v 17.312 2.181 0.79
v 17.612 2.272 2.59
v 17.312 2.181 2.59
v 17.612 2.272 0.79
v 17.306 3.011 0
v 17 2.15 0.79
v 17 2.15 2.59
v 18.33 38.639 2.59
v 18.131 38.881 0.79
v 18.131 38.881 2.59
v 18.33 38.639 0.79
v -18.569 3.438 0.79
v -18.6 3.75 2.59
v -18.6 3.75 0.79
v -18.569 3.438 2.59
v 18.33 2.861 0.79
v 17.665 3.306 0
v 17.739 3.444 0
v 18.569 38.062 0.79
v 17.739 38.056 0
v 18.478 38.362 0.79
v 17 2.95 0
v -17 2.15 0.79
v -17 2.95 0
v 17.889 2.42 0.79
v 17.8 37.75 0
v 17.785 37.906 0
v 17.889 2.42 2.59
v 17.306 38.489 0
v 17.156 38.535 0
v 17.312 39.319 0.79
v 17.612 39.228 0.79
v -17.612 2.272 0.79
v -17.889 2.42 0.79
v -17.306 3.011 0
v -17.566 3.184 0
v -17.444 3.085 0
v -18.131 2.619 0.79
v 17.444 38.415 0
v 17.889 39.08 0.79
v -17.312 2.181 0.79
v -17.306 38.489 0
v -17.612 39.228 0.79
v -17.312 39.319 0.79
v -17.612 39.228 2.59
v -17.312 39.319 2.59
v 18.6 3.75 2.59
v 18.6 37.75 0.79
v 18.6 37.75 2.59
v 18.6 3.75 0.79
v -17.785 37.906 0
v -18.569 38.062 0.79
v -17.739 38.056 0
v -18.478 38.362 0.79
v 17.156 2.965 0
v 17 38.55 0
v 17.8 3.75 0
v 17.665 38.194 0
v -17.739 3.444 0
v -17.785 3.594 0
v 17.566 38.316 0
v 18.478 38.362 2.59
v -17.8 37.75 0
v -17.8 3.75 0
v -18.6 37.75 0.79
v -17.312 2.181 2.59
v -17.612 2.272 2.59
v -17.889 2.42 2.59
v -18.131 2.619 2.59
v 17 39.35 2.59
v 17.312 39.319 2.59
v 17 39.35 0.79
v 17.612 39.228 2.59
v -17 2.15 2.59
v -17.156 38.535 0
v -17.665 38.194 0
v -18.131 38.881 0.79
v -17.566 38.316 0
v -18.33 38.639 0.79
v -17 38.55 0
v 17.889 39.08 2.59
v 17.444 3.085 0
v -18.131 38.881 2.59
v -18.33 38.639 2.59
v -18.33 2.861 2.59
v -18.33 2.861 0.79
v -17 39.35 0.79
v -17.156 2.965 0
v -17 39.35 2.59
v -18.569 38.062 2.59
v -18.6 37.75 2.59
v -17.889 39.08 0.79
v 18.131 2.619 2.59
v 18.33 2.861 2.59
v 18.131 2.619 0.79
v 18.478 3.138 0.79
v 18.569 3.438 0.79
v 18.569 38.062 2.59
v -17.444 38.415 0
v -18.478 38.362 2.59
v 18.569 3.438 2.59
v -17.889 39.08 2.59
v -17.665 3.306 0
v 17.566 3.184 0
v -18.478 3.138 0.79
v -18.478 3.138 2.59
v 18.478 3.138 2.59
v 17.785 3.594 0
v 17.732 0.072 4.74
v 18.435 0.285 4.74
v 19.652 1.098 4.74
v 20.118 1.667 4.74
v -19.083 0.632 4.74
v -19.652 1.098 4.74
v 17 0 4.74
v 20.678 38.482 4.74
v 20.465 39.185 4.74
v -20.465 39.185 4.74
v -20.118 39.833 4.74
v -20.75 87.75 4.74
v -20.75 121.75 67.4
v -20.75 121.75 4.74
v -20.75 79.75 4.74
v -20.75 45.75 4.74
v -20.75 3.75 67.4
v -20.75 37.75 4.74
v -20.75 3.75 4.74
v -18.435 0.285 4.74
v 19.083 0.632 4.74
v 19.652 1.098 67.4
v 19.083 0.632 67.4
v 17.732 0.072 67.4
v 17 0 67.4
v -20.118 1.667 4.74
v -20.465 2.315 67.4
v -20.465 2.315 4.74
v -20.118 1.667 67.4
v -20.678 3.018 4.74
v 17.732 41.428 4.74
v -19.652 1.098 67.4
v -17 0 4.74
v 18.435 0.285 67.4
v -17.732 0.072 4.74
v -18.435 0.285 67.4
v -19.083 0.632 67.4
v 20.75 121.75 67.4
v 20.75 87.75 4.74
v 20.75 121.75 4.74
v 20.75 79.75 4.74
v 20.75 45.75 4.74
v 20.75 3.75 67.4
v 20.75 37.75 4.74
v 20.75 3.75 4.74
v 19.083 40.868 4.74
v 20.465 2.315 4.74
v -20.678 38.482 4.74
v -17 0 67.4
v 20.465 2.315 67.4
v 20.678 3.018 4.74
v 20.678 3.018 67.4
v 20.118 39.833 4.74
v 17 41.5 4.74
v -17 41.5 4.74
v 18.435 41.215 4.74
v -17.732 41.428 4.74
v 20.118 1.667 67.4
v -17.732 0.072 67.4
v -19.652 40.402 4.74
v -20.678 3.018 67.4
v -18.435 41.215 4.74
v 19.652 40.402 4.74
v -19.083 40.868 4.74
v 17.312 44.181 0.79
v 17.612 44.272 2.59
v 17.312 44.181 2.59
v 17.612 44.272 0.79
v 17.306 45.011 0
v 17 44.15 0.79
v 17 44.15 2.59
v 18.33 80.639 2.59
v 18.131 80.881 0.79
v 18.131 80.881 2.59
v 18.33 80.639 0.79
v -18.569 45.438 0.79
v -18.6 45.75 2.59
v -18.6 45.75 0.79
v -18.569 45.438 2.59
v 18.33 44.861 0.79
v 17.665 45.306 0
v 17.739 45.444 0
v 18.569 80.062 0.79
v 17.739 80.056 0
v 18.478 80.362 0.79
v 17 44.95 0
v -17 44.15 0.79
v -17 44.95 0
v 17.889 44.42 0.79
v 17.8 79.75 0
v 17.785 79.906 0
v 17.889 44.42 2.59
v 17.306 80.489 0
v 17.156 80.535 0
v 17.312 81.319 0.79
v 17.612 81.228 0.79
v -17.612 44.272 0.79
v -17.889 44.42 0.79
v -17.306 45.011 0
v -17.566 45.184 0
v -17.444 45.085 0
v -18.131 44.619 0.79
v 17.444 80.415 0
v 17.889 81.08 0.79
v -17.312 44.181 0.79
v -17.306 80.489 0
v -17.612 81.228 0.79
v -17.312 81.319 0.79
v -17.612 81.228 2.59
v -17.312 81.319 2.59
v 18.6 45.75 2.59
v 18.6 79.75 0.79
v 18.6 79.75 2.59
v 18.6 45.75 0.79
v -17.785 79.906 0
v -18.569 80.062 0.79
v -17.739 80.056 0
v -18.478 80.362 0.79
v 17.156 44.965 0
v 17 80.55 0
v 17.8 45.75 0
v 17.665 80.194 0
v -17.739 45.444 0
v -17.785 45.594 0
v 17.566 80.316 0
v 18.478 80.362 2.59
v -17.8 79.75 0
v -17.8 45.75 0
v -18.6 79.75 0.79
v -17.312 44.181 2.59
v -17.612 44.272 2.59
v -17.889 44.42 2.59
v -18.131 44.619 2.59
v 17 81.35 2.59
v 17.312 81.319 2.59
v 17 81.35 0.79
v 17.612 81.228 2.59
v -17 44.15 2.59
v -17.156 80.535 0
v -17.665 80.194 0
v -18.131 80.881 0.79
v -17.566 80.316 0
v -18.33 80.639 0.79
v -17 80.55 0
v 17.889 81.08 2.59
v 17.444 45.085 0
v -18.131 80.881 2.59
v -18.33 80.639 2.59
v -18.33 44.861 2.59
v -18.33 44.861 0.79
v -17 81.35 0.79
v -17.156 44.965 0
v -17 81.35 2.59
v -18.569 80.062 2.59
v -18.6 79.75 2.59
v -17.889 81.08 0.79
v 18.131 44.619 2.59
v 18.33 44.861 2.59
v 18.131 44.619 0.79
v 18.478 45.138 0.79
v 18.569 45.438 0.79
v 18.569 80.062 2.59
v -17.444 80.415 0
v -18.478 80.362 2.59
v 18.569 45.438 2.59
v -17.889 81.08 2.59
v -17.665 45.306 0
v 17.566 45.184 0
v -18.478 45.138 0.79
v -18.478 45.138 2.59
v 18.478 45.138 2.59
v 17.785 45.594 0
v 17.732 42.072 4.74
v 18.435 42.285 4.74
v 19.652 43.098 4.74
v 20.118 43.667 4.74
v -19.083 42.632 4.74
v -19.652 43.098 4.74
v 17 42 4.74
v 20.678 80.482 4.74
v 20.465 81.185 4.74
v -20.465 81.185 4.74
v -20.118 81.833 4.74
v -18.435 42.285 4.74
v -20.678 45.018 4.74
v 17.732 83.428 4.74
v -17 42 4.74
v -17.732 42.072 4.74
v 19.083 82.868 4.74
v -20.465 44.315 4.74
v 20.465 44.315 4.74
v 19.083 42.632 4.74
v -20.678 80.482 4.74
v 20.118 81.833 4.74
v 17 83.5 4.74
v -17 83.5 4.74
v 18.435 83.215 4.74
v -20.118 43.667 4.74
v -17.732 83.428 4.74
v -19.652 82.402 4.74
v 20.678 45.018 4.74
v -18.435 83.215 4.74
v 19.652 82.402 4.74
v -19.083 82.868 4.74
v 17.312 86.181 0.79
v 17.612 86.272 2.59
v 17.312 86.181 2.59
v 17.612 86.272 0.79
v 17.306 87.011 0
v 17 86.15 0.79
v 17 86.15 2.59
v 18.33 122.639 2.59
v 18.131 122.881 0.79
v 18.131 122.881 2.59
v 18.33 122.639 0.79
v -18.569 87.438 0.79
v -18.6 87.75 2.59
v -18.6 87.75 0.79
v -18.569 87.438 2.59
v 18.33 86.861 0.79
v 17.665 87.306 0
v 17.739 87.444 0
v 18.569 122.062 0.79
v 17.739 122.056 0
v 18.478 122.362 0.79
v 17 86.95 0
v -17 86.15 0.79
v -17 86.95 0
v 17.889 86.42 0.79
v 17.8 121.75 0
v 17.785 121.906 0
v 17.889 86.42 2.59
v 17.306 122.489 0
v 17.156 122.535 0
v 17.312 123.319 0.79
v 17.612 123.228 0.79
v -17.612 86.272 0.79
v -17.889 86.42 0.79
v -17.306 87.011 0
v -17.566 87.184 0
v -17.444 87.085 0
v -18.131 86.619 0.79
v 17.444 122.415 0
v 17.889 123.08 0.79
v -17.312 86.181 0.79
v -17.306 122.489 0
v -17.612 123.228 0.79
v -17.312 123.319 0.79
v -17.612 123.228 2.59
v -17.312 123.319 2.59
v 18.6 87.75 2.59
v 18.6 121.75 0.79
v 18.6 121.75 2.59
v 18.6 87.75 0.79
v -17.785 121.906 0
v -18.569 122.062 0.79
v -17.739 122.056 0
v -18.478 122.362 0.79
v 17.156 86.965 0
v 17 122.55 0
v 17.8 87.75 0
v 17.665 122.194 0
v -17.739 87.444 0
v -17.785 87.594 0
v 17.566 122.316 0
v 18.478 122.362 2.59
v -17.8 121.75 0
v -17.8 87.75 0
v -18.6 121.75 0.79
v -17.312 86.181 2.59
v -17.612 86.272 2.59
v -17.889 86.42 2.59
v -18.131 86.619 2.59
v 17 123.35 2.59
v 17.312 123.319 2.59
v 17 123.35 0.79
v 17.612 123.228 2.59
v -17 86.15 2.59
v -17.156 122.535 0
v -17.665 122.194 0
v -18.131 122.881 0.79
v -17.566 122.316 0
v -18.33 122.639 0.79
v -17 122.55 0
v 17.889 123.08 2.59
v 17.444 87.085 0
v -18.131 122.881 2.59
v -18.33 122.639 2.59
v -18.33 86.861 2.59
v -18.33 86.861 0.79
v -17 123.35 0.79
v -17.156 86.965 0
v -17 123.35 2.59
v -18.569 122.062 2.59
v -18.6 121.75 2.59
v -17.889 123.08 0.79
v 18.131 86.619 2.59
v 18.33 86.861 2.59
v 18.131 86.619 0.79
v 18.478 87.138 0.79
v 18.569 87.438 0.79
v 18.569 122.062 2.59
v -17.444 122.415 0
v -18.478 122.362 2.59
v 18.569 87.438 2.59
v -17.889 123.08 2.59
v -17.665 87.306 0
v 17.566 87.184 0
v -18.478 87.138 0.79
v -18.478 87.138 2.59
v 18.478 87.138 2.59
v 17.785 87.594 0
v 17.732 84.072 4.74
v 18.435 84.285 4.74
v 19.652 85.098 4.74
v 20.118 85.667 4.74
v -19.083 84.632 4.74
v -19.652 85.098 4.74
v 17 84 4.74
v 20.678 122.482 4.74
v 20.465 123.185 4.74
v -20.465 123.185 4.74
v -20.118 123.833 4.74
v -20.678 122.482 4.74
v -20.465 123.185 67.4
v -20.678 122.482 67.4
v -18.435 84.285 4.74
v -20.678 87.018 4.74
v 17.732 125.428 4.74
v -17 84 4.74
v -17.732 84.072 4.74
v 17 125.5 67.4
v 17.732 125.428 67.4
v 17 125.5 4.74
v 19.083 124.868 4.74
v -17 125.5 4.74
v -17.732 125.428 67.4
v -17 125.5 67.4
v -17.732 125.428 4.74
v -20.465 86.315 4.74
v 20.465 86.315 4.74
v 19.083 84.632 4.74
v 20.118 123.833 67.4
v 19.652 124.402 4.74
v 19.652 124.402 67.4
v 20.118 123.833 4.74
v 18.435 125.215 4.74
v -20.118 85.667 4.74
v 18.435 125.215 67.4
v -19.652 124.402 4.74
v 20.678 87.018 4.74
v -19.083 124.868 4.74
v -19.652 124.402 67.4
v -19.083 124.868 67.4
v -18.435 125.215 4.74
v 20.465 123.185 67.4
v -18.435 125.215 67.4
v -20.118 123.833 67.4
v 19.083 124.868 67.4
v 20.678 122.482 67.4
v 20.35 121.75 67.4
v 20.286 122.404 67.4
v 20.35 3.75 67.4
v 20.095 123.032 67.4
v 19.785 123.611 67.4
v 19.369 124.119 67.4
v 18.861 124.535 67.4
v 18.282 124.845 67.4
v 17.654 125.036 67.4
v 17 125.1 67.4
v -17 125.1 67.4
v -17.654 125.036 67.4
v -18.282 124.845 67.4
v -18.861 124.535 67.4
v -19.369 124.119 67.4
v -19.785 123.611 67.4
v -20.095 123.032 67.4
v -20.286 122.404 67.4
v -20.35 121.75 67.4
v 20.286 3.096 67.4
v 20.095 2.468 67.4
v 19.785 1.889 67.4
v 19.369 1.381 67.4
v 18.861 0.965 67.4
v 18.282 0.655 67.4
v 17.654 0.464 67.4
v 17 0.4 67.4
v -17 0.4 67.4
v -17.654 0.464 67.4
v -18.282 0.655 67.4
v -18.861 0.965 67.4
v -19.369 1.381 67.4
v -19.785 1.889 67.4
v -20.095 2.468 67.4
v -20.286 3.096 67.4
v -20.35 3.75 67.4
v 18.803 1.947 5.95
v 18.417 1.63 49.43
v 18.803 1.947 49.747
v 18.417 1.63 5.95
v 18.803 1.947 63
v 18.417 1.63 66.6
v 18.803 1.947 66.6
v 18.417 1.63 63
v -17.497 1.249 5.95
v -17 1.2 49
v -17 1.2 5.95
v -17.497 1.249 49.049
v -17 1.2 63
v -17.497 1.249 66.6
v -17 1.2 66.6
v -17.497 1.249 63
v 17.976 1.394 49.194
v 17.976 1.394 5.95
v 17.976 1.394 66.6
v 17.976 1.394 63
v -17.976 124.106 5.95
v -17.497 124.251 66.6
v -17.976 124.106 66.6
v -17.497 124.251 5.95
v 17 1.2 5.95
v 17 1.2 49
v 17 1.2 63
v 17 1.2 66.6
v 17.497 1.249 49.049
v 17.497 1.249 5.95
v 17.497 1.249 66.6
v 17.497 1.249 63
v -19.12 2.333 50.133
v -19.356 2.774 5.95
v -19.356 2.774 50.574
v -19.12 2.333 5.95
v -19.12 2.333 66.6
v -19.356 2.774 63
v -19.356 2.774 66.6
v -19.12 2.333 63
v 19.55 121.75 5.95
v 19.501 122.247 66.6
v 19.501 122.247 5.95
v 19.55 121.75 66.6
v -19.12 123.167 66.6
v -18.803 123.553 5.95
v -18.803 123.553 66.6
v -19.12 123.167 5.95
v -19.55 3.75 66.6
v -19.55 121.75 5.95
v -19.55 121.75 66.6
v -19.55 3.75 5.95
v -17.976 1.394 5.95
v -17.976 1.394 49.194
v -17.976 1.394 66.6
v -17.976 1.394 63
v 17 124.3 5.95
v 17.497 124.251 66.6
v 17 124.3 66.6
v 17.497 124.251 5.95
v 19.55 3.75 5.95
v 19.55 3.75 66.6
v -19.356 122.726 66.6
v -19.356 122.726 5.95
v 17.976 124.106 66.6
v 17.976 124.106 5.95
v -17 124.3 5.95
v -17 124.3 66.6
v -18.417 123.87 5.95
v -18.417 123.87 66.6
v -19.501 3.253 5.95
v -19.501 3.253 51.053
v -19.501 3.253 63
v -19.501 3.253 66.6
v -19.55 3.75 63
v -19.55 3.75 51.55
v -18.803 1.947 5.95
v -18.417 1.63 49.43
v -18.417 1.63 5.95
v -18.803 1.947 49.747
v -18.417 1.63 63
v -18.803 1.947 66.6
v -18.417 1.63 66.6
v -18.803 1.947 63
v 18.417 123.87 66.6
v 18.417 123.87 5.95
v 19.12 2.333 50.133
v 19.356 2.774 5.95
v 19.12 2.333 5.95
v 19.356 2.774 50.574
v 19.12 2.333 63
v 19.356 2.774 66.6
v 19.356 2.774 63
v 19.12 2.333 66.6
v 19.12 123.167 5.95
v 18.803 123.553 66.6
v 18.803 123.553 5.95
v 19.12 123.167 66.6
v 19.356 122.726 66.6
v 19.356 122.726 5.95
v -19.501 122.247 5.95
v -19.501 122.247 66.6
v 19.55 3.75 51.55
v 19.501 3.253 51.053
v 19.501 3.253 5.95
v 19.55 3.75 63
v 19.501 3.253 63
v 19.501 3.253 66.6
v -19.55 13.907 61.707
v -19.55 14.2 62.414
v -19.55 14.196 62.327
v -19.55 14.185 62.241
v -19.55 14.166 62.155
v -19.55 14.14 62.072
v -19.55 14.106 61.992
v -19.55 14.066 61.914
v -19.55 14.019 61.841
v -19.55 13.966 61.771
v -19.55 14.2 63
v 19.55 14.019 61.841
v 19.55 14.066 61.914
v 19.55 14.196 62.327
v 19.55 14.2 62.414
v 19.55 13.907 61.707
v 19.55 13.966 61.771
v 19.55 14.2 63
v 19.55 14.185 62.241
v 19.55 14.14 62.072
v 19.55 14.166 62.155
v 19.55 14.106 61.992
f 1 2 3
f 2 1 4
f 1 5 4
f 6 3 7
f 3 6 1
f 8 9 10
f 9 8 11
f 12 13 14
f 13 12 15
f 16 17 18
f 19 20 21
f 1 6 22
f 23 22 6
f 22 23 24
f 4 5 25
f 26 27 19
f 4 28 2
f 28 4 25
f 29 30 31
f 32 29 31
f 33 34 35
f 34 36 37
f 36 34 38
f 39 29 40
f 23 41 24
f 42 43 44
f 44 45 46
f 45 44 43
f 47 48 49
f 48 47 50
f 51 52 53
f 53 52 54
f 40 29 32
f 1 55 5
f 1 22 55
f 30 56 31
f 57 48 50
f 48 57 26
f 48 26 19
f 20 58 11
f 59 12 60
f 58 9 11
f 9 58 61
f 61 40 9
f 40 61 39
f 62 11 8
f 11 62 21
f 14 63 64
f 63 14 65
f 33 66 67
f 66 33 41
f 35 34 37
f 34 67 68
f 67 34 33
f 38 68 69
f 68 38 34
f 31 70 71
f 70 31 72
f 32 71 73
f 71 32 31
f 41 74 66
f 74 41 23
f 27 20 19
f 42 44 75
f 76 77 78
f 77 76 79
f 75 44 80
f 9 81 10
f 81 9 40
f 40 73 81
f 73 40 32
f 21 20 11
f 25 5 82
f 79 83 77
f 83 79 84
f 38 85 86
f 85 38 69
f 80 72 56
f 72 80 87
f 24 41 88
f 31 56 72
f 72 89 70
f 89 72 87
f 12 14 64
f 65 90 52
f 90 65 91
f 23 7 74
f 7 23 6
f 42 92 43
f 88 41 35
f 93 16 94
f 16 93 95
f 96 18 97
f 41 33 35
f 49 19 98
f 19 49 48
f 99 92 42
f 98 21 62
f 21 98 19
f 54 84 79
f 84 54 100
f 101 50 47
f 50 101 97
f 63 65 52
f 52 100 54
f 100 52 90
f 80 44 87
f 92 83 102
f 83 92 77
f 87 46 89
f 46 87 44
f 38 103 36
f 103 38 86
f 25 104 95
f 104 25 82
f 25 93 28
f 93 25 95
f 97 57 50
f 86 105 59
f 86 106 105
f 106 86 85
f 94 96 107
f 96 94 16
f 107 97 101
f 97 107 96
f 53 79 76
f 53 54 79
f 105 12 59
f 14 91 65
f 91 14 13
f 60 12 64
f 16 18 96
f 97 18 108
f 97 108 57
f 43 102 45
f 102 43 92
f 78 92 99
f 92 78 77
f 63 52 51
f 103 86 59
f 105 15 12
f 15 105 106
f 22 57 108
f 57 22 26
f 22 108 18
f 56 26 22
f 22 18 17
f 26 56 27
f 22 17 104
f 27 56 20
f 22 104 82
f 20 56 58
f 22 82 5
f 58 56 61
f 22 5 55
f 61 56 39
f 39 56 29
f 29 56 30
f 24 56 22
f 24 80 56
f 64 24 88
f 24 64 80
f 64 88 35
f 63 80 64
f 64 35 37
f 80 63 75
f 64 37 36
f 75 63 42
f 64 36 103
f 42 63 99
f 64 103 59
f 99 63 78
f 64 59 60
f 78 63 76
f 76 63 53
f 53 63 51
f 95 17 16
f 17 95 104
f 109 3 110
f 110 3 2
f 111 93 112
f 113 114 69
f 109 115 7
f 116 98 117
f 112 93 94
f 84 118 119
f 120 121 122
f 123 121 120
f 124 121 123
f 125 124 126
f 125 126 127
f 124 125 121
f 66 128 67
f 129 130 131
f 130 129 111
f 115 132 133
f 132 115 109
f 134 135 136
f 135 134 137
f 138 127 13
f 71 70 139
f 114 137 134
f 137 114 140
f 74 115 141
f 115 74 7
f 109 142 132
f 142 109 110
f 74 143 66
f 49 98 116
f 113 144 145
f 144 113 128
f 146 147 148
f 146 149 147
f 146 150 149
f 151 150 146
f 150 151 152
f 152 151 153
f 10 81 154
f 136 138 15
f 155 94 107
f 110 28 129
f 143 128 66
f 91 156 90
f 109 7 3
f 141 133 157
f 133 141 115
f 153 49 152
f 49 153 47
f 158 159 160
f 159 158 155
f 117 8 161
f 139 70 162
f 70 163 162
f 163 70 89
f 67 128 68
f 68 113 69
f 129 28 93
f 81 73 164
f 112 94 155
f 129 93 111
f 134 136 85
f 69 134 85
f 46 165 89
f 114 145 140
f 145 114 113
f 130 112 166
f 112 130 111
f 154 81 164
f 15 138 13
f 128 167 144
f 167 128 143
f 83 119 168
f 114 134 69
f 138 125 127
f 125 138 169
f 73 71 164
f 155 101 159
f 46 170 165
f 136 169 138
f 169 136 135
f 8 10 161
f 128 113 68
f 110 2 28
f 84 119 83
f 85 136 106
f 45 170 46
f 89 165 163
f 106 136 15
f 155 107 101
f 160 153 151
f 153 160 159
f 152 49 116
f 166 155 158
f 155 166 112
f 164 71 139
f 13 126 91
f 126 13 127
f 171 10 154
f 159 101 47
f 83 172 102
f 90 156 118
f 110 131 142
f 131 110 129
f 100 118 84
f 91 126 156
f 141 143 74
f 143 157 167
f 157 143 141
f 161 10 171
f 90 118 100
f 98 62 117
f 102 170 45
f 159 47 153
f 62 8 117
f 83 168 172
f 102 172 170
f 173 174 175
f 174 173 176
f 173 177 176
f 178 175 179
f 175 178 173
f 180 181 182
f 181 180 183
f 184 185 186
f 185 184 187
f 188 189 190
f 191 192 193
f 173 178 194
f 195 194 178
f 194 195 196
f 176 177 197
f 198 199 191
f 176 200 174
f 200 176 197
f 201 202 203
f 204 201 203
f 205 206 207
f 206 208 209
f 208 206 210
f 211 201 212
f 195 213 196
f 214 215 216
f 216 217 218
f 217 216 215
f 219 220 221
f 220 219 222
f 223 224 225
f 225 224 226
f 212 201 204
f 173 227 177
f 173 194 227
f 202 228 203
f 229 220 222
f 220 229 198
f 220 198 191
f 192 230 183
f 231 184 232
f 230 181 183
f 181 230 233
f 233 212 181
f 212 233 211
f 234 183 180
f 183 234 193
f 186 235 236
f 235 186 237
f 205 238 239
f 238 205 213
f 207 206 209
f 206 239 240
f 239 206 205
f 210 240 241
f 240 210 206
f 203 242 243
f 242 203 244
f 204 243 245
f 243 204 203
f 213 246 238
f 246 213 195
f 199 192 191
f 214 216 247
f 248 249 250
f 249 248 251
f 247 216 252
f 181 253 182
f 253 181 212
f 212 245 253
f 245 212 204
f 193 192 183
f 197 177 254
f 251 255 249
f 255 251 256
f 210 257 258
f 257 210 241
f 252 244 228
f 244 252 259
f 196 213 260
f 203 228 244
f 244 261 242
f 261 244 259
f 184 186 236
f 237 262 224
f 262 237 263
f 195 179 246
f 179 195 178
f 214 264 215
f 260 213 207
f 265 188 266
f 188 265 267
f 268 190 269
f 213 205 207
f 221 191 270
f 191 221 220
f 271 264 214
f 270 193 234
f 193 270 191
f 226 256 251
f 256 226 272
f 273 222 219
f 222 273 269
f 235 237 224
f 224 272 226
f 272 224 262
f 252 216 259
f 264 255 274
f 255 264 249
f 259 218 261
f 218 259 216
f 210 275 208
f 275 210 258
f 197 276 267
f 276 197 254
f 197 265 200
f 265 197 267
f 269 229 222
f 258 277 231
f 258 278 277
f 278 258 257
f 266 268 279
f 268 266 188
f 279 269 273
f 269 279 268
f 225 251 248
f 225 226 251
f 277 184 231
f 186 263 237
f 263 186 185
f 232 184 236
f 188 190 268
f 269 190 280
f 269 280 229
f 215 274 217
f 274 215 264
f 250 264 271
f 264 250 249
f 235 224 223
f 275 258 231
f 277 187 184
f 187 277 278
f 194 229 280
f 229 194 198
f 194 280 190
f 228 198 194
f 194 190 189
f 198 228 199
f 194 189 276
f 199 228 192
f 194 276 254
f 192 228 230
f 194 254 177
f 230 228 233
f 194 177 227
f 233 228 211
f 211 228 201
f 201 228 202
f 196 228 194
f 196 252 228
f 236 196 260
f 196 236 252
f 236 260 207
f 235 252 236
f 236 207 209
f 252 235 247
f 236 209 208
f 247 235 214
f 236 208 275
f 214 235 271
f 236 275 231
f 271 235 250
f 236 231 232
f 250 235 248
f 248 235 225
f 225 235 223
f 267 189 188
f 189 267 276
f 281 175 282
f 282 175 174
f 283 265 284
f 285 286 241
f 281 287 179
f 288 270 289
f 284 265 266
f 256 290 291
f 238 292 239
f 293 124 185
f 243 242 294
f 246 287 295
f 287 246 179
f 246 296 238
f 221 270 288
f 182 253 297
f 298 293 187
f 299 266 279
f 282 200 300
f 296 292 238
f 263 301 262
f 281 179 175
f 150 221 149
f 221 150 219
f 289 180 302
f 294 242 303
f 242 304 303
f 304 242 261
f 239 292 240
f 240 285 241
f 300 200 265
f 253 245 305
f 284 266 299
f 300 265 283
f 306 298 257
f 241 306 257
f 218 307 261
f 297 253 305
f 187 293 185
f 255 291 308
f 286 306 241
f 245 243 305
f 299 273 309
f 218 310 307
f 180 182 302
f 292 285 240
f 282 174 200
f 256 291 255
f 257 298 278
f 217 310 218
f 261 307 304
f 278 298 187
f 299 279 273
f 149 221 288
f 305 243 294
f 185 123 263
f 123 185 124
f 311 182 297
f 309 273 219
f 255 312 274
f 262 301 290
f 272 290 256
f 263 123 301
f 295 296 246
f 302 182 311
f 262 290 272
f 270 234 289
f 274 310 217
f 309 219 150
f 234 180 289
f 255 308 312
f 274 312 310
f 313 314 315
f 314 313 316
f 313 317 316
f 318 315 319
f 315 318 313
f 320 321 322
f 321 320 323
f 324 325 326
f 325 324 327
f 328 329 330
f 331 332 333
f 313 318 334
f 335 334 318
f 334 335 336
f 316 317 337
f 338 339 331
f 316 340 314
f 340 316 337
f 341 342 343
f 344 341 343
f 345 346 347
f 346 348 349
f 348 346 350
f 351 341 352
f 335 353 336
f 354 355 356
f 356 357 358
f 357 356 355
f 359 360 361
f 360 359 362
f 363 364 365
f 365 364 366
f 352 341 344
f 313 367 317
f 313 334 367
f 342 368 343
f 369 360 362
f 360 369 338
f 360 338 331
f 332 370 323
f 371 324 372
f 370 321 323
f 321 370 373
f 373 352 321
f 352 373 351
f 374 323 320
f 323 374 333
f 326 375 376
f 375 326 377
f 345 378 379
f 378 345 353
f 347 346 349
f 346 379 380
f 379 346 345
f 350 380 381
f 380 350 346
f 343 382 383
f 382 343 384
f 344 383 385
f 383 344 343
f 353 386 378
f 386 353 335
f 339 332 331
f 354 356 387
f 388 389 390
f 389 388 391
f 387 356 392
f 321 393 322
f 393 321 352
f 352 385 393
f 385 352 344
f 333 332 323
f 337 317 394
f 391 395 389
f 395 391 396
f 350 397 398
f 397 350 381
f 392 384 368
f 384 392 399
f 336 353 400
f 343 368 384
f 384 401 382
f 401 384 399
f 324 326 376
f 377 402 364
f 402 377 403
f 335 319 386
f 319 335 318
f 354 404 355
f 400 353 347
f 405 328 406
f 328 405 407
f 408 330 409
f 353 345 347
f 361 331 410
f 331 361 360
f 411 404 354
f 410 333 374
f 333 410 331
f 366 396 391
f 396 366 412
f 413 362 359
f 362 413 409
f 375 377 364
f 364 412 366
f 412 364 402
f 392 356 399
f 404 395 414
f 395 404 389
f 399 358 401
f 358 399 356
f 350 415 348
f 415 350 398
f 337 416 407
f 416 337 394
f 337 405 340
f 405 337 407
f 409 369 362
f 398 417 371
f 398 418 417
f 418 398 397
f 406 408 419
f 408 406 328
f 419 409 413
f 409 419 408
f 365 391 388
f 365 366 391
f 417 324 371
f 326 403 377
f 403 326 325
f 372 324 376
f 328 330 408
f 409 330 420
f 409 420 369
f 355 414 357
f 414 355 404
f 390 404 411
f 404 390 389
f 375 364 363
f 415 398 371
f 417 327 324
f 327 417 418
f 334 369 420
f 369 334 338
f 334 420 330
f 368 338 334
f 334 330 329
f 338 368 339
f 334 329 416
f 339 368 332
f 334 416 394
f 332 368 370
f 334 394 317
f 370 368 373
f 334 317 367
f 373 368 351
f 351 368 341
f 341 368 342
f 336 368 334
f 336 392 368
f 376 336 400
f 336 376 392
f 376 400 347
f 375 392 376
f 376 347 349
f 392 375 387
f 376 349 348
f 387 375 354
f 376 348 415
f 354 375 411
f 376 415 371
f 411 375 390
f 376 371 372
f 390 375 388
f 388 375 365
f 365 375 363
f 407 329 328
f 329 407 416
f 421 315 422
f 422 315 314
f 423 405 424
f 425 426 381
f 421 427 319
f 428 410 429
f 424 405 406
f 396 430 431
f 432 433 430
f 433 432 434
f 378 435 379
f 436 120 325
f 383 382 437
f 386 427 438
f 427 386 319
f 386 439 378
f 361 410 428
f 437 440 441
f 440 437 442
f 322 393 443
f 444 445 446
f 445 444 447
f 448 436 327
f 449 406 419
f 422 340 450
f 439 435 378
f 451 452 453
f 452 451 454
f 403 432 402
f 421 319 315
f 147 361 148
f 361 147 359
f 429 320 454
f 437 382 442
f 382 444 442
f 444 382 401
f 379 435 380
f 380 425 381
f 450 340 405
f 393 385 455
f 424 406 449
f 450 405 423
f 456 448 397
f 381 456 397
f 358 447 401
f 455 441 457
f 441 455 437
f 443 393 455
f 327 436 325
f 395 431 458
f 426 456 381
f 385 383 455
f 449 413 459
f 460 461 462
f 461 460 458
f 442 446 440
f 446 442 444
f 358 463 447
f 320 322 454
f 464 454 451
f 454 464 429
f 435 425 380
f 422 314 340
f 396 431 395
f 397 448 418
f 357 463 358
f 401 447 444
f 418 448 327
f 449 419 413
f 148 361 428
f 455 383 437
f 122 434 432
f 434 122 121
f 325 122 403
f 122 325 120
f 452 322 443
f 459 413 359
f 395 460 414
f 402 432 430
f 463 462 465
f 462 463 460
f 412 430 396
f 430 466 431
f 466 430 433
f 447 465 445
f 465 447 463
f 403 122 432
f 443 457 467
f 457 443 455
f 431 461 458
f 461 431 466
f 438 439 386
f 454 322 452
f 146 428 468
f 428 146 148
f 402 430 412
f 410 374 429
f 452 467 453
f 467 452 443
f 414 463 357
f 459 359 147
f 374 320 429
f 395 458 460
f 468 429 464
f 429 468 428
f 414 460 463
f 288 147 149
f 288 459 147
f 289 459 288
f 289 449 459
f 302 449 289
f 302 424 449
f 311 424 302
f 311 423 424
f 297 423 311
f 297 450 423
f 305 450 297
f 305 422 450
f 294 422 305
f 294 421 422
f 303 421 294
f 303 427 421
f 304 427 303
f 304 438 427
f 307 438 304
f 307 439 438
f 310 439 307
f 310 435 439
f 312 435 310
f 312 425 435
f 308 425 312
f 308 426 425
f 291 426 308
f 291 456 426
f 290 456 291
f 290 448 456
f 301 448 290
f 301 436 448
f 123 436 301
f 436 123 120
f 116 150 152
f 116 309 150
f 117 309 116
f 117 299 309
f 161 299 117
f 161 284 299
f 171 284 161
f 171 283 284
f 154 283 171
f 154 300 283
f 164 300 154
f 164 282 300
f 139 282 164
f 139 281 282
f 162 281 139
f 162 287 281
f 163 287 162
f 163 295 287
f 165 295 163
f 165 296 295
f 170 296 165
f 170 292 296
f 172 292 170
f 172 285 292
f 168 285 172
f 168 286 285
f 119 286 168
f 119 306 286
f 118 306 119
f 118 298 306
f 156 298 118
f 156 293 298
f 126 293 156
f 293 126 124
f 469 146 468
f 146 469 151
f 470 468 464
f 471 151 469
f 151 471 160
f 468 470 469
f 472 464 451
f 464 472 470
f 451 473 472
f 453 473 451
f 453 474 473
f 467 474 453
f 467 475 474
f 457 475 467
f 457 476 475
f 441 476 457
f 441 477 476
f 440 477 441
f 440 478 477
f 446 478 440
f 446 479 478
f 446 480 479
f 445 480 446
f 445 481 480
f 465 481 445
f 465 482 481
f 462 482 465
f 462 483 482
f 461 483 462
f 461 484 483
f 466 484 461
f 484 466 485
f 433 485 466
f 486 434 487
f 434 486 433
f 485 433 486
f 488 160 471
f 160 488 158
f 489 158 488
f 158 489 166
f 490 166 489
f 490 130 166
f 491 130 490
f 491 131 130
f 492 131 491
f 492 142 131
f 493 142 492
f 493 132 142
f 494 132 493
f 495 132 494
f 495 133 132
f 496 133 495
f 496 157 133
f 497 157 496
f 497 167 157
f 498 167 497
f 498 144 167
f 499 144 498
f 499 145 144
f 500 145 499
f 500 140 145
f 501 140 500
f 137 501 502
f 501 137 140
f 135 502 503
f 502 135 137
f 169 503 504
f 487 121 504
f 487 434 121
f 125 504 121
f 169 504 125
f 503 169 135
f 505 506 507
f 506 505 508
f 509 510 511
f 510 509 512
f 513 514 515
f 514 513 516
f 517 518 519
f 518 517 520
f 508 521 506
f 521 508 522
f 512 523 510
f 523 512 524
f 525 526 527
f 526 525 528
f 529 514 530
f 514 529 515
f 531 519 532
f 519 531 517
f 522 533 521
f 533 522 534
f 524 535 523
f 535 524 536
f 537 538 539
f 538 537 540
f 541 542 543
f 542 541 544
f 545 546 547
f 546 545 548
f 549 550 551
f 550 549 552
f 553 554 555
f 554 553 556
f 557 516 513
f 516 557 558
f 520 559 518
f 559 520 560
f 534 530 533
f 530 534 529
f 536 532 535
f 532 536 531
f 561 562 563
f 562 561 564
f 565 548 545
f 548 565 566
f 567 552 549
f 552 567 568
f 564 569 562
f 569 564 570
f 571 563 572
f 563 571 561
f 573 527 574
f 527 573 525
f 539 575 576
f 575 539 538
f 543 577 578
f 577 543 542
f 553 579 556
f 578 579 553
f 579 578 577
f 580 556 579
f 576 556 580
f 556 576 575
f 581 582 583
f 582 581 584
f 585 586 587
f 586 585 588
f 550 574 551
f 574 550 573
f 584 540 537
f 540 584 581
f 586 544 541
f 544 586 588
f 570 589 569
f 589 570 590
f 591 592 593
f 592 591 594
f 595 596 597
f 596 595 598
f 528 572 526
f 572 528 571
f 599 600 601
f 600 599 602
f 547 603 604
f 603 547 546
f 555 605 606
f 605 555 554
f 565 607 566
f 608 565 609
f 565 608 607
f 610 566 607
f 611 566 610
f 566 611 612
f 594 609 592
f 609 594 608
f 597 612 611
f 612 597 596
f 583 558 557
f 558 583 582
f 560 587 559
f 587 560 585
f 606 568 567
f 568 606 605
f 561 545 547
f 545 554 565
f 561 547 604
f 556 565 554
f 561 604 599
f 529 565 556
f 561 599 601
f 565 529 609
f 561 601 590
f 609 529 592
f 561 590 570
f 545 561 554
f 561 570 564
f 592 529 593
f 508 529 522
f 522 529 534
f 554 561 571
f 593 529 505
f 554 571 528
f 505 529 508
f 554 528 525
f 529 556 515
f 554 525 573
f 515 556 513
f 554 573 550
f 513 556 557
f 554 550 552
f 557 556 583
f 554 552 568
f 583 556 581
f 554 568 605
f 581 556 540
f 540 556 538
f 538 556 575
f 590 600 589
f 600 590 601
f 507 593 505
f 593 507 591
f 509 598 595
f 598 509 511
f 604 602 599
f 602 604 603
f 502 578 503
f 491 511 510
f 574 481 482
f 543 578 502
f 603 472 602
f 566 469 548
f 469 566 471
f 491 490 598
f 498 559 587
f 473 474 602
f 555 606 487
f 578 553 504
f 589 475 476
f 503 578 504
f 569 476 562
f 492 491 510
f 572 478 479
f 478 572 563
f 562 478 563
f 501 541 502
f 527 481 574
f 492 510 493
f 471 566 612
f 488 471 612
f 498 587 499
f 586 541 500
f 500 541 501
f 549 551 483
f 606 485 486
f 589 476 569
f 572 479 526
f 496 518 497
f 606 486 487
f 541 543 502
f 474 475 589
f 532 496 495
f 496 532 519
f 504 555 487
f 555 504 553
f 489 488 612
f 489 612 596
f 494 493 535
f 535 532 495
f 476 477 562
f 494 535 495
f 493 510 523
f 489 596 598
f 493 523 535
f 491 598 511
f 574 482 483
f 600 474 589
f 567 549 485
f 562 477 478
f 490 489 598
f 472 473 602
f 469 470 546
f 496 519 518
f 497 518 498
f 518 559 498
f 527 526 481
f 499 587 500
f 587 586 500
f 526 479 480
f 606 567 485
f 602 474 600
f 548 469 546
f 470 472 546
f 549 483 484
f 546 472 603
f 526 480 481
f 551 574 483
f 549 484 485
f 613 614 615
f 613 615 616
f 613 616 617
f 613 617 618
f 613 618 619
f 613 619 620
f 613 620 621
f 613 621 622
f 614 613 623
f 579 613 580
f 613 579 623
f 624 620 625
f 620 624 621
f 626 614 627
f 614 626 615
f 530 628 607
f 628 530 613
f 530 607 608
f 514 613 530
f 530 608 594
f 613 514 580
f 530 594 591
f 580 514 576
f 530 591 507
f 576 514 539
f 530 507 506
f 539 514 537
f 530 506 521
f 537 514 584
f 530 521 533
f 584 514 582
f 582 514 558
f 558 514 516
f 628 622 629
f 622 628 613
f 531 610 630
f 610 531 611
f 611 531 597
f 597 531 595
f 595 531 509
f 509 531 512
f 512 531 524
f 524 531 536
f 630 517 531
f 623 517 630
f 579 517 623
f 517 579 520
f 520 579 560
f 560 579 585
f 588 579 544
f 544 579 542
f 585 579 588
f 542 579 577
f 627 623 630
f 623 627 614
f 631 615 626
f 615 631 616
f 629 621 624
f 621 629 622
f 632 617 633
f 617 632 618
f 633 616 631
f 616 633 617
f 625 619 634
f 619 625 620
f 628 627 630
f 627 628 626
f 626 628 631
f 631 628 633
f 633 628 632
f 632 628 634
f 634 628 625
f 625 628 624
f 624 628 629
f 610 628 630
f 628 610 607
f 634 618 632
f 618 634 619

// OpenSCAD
// file: ../../../modules/gridfinity.scad
// Gridfinity ベースプレートの共有 module。
// 寸法は Gridfinity 仕様 (Zack Freedman) の baseplate 輪郭に従う:
//   ピッチ 42、ソケット上端開口 41.5 (角 R4)、上から 45° 面取り 2.15 →
//   垂直 1.8 (37.2 角・R1.85) → 45° 面取り 0.7 → 底 35.8 角 (R1.15)。
//   ソケット深さ = 2.15 + 1.8 + 0.7 = 4.65。
//
// 座標系: X が列方向 (中央が 0)、Y が行方向 (板の前端が 0)、Z=0 が板の底面。
// 板の外形は grid とは独立に rim で与えるので、grid より大きい板 (縁付き) を
// 作れる。ソケットは rim=[left, right, front, back] の内側へ 42 ピッチで並ぶ。

gf_pitch = 42;
gf_socket_top = 41.5; // 上端開口
gf_socket_mid = 37.2; // 垂直部
gf_socket_bot = 35.8; // 底
gf_socket_r_top = 4;
gf_socket_r_mid = 1.85;
gf_socket_r_bot = 1.15;
gf_chamfer_top = 2.15;
gf_wall_h = 1.8;
gf_chamfer_bot = 0.7;
gf_socket_depth = gf_chamfer_top + gf_wall_h + gf_chamfer_bot; // 4.65
gf_fn = 32;
gf_eps = 0.01; // hull 用の薄板の厚さ
gf_over = 0.5; // 切削の抜き代

// 角丸正方形または矩形 (w は一辺、または [幅, 奥行き]、角 R)
module
gf_rounded_square(w, r)
{
    offset(r = r, $fn = gf_fn)
        square(is_list(w) ? w - [ 2 * r, 2 * r ] : w - 2 * r, center = true);
}

// 厚さ gf_eps の角丸正方形の薄板を z に置く (hull の骨)
module
gf_slab(w, r, z)
{
    translate([ 0, 0, z ]) linear_extrude(gf_eps) gf_rounded_square(w, r);
}

// ソケット1個の切削体。z=0 がソケットの底 (床の天面)、+Z へ 4.65 で天面に出る。
// clearance は嵌合の逃げで、輪郭を全周へ clearance だけ外へ出す (幅 +2c、角 R
// +c)。pitch_x は X 方向のセル幅。端数でも角 R と面取りの寸法を保つ。
module
gf_socket_cut(clearance = 0, pitch_x = gf_pitch)
{
    z1 = gf_chamfer_bot;
    z2 = z1 + gf_wall_h;
    z3 = gf_socket_depth;
    c = clearance;
    assert(pitch_x > gf_pitch - gf_socket_top + 2 * gf_socket_r_top,
           "Cell width is too small for the socket corner radius");
    delta = [ pitch_x - gf_pitch, 0 ];
    bot = [ gf_socket_bot + 2 * c, gf_socket_bot + 2 * c ] + delta;
    mid = [ gf_socket_mid + 2 * c, gf_socket_mid + 2 * c ] + delta;
    top = [ gf_socket_top + 2 * c, gf_socket_top + 2 * c ] + delta;
    hull()
    {
        gf_slab(bot, gf_socket_r_bot + c, 0);
        gf_slab(mid, gf_socket_r_mid + c, z1 - gf_eps);
    }
    hull()
    {
        gf_slab(mid, gf_socket_r_mid + c, z1 - gf_eps);
        gf_slab(mid, gf_socket_r_mid + c, z2 - gf_eps);
    }
    hull()
    {
        gf_slab(mid, gf_socket_r_mid + c, z2 - gf_eps);
        gf_slab(top, gf_socket_r_top + c, z3 - gf_eps);
    }
    // 天面より上へ抜く (天面と同一平面の退化した面を残さない)
    gf_slab(top, gf_socket_r_top + c, z3 - gf_eps);
    translate([ 0, 0, z3 - gf_eps ]) linear_extrude(gf_over + gf_eps)
        gf_rounded_square(top, gf_socket_r_top + c);
}

// ベースプレート。cols x rows のソケットを床 floor_t の上に彫る。
// rim = [left, right, front, back] はソケット列の外側に残す縁の幅。
// 板の幅 = cols*42 + left + right、奥行き = rows*42 + front + back。
// cols の端数は左端の細幅セルになる。rows は正の整数。
// clearance はソケットの嵌合の逃げ (gf_socket_cut を参照)。
module
gf_baseplate(cols, rows, rim = [ 0, 0, 0, 0 ], floor_t = 1, clearance = 0)
{
    grid_w = cols * gf_pitch;
    grid_d = rows * gf_pitch;
    plate_w = grid_w + rim[0] + rim[1];
    plate_d = grid_d + rim[2] + rim[3];
    x0 = -plate_w / 2 + rim[0]; // ソケット列の左端
    first_pitch = grid_w - (ceil(cols) - 1) * gf_pitch;
    difference()
    {
        translate([ -plate_w / 2, 0, 0 ])
            cube([ plate_w, plate_d, floor_t + gf_socket_depth ]);
        for (c = [0:ceil(cols) - 1], r = [0:rows - 1])
            translate([
                x0 + (c == 0 ? first_pitch / 2
                             : first_pitch + (c - 0.5) * gf_pitch),
                rim[2] + (r + 0.5) * gf_pitch,
                floor_t
            ]) gf_socket_cut(clearance, c == 0 ? first_pitch : gf_pitch);
    }
}
// file: ../../../modules/gridfinity_bins.scad
include <gridfinity_bin.scad>

// assets/gridfinity-bin/ の bin 群の共通値と、サイズ 3 引数の払い出し口。
// 単体では何も描かない。設計の経緯と確定値は
// ledger/designs/gridfinity-bin-4u.md が正本。
// 通常binは4U/9U、X={1,1.5,2,2.5,3} × Y={1,2,3,4,5,5.5}。
// 両軸に端数を持つ組み合わせはassetに置かない（各高さ28種）。
// Xが横、Yがラベルの壁から奥、unitsが高さ（7mm単位）。
wall = 1.2;    // 0.4 ノズル 3 本
floor_t = 1.2; // 底 (4.75) の上に載せる床。床の天面 z = 5.95
label_d = 13;  // 12mm 幅のラベルシールを貼る天板の張り出し
label_t = 1; // 天板の厚さ (user 指定)。下は 45° の無垢のくさび
label_r = 1; // 天板の先端と 45° 面の境目の R (user 指定)
// カードケース (goods/card_case_2x3x4u.scad) の値。カードは ISO/IEC 7810 ID-1 (85.6 × 54 ×
// 0.76、隅 R3) で、長辺を Y (rows 方向) に寝かせ、X 中央・手前の壁から 10 奥に置く。ポケットは
// カードより 1 大きい (片側 0.5)。右奥のマスは壁の内面まで抜き、床と底を外形に平行な 45° の窪みにする。
// ポケットの左右の埋めの天面 (幅 13.05) が 12mm のラベルを貼る帯。ポケットと穴の交点の
// 縦エッジは丸める (開口の上縁は丸めない: 壁を上端まで垂直に保ち、収まる枚数を減らさない)
card_w = 54;    // カードの短辺 (X)。user 指定「高さ 54」
card_d = 85.6;  // カードの長辺 (Y)。user 指定「幅 85.6」
card_clear = 1; // ポケットの余裕 (user 指定「+1mm」)
// ポケットの手前の辺の、手前の壁の内面からの距離 (user 指定「10mm」)
card_off = 10;
// ポケットの平面の隅 R (user 指定「角の丸み 3mm」。ID-1 の隅は 2.88..3.48)
card_r = 3;
// ポケットと穴が交わる所の、埋めの凸の縦エッジの R (指の当たる角)
card_edge_r = 2;
recess_skin = floor_t + 1.75; // 窪みの床 z (底の皮)。user 指定「壁厚と同じ 1.2 は過剰、1.75 返す」

function bin_contract(cols, rows, units) = str("CONTRACT units=",
                                               units,
                                               " pitch=",
                                               gf_pitch,
                                               " outer=",
                                               gfb_outer,
                                               " h=",
                                               units* gfb_unit,
                                               " lip=",
                                               gfb_lip_h,
                                               " base=",
                                               gfb_base_bot,
                                               "/",
                                               gfb_base_mid,
                                               "/",
                                               gfb_outer,
                                               " base_h=",
                                               gfb_base_h,
                                               " wall=",
                                               wall,
                                               " floor_top=",
                                               gfb_base_h + floor_t,
                                               " label=",
                                               label_d,
                                               "x",
                                               label_t,
                                               " wedge=45 fillet=",
                                               label_r,
                                               " bin=",
                                               cols,
                                               "x",
                                               rows,
                                               " size=",
                                               cols* gf_pitch - 0.5,
                                               "x",
                                               rows* gf_pitch - 0.5);

// (cols, rows, units) でラベル付き bin を払い出す。例: gridfinity_bin(2, 4, 4)
module
gridfinity_bin(cols, rows, units = 4)
{
    echo(bin_contract(cols, rows, units));
    gfb_bin(cols, rows, units, wall, floor_t, label_d, label_t, label_r);
}

function card_contract(cols, rows, units) = str("CONTRACT card units=",
                                                units,
                                                " bin=",
                                                cols,
                                                "x",
                                                rows,
                                                " size=",
                                                cols* gf_pitch - 0.5,
                                                "x",
                                                rows* gf_pitch - 0.5,
                                                " h=",
                                                units* gfb_unit,
                                                " lip=",
                                                gfb_lip_h,
                                                " floor_top=",
                                                gfb_base_h + floor_t,
                                                " card=",
                                                card_w,
                                                "x",
                                                card_d,
                                                " pocket=",
                                                card_w + card_clear,
                                                "x",
                                                card_d + card_clear,
                                                " at=",
                                                -(card_w + card_clear) / 2,
                                                ",",
                                                wall + card_off,
                                                " hole=",
                                                (cols - 1) / 2 * gf_pitch - gfb_outer / 2,
                                                ",",
                                                (rows - 0.5) * gf_pitch - 0.25 - gfb_outer / 2,
                                                " hole_r=",
                                                gfb_outer_r - wall,
                                                " recess=",
                                                gfb_outer - 2 * wall,
                                                "/",
                                                gfb_base_mid - 2 * wall,
                                                " recess_floor=",
                                                recess_skin,
                                                " r=",
                                                card_r,
                                                " edge_r=",
                                                card_edge_r);

// (cols, rows, units) でカードケースを払い出す。例: gridfinity_card_case(2, 3, 4)
module
gridfinity_card_case(cols, rows, units = 4)
{
    echo(card_contract(cols, rows, units));
    gfb_card_case(cols,
                  rows,
                  units,
                  wall,
                  floor_t,
                  [ card_w, card_d ],
                  card_clear,
                  card_off,
                  card_r,
                  recess_skin,
                  card_edge_r);
}
// main file
include <../../../modules/gridfinity_bins.scad>

gridfinity_bin(1, 3, 9);
